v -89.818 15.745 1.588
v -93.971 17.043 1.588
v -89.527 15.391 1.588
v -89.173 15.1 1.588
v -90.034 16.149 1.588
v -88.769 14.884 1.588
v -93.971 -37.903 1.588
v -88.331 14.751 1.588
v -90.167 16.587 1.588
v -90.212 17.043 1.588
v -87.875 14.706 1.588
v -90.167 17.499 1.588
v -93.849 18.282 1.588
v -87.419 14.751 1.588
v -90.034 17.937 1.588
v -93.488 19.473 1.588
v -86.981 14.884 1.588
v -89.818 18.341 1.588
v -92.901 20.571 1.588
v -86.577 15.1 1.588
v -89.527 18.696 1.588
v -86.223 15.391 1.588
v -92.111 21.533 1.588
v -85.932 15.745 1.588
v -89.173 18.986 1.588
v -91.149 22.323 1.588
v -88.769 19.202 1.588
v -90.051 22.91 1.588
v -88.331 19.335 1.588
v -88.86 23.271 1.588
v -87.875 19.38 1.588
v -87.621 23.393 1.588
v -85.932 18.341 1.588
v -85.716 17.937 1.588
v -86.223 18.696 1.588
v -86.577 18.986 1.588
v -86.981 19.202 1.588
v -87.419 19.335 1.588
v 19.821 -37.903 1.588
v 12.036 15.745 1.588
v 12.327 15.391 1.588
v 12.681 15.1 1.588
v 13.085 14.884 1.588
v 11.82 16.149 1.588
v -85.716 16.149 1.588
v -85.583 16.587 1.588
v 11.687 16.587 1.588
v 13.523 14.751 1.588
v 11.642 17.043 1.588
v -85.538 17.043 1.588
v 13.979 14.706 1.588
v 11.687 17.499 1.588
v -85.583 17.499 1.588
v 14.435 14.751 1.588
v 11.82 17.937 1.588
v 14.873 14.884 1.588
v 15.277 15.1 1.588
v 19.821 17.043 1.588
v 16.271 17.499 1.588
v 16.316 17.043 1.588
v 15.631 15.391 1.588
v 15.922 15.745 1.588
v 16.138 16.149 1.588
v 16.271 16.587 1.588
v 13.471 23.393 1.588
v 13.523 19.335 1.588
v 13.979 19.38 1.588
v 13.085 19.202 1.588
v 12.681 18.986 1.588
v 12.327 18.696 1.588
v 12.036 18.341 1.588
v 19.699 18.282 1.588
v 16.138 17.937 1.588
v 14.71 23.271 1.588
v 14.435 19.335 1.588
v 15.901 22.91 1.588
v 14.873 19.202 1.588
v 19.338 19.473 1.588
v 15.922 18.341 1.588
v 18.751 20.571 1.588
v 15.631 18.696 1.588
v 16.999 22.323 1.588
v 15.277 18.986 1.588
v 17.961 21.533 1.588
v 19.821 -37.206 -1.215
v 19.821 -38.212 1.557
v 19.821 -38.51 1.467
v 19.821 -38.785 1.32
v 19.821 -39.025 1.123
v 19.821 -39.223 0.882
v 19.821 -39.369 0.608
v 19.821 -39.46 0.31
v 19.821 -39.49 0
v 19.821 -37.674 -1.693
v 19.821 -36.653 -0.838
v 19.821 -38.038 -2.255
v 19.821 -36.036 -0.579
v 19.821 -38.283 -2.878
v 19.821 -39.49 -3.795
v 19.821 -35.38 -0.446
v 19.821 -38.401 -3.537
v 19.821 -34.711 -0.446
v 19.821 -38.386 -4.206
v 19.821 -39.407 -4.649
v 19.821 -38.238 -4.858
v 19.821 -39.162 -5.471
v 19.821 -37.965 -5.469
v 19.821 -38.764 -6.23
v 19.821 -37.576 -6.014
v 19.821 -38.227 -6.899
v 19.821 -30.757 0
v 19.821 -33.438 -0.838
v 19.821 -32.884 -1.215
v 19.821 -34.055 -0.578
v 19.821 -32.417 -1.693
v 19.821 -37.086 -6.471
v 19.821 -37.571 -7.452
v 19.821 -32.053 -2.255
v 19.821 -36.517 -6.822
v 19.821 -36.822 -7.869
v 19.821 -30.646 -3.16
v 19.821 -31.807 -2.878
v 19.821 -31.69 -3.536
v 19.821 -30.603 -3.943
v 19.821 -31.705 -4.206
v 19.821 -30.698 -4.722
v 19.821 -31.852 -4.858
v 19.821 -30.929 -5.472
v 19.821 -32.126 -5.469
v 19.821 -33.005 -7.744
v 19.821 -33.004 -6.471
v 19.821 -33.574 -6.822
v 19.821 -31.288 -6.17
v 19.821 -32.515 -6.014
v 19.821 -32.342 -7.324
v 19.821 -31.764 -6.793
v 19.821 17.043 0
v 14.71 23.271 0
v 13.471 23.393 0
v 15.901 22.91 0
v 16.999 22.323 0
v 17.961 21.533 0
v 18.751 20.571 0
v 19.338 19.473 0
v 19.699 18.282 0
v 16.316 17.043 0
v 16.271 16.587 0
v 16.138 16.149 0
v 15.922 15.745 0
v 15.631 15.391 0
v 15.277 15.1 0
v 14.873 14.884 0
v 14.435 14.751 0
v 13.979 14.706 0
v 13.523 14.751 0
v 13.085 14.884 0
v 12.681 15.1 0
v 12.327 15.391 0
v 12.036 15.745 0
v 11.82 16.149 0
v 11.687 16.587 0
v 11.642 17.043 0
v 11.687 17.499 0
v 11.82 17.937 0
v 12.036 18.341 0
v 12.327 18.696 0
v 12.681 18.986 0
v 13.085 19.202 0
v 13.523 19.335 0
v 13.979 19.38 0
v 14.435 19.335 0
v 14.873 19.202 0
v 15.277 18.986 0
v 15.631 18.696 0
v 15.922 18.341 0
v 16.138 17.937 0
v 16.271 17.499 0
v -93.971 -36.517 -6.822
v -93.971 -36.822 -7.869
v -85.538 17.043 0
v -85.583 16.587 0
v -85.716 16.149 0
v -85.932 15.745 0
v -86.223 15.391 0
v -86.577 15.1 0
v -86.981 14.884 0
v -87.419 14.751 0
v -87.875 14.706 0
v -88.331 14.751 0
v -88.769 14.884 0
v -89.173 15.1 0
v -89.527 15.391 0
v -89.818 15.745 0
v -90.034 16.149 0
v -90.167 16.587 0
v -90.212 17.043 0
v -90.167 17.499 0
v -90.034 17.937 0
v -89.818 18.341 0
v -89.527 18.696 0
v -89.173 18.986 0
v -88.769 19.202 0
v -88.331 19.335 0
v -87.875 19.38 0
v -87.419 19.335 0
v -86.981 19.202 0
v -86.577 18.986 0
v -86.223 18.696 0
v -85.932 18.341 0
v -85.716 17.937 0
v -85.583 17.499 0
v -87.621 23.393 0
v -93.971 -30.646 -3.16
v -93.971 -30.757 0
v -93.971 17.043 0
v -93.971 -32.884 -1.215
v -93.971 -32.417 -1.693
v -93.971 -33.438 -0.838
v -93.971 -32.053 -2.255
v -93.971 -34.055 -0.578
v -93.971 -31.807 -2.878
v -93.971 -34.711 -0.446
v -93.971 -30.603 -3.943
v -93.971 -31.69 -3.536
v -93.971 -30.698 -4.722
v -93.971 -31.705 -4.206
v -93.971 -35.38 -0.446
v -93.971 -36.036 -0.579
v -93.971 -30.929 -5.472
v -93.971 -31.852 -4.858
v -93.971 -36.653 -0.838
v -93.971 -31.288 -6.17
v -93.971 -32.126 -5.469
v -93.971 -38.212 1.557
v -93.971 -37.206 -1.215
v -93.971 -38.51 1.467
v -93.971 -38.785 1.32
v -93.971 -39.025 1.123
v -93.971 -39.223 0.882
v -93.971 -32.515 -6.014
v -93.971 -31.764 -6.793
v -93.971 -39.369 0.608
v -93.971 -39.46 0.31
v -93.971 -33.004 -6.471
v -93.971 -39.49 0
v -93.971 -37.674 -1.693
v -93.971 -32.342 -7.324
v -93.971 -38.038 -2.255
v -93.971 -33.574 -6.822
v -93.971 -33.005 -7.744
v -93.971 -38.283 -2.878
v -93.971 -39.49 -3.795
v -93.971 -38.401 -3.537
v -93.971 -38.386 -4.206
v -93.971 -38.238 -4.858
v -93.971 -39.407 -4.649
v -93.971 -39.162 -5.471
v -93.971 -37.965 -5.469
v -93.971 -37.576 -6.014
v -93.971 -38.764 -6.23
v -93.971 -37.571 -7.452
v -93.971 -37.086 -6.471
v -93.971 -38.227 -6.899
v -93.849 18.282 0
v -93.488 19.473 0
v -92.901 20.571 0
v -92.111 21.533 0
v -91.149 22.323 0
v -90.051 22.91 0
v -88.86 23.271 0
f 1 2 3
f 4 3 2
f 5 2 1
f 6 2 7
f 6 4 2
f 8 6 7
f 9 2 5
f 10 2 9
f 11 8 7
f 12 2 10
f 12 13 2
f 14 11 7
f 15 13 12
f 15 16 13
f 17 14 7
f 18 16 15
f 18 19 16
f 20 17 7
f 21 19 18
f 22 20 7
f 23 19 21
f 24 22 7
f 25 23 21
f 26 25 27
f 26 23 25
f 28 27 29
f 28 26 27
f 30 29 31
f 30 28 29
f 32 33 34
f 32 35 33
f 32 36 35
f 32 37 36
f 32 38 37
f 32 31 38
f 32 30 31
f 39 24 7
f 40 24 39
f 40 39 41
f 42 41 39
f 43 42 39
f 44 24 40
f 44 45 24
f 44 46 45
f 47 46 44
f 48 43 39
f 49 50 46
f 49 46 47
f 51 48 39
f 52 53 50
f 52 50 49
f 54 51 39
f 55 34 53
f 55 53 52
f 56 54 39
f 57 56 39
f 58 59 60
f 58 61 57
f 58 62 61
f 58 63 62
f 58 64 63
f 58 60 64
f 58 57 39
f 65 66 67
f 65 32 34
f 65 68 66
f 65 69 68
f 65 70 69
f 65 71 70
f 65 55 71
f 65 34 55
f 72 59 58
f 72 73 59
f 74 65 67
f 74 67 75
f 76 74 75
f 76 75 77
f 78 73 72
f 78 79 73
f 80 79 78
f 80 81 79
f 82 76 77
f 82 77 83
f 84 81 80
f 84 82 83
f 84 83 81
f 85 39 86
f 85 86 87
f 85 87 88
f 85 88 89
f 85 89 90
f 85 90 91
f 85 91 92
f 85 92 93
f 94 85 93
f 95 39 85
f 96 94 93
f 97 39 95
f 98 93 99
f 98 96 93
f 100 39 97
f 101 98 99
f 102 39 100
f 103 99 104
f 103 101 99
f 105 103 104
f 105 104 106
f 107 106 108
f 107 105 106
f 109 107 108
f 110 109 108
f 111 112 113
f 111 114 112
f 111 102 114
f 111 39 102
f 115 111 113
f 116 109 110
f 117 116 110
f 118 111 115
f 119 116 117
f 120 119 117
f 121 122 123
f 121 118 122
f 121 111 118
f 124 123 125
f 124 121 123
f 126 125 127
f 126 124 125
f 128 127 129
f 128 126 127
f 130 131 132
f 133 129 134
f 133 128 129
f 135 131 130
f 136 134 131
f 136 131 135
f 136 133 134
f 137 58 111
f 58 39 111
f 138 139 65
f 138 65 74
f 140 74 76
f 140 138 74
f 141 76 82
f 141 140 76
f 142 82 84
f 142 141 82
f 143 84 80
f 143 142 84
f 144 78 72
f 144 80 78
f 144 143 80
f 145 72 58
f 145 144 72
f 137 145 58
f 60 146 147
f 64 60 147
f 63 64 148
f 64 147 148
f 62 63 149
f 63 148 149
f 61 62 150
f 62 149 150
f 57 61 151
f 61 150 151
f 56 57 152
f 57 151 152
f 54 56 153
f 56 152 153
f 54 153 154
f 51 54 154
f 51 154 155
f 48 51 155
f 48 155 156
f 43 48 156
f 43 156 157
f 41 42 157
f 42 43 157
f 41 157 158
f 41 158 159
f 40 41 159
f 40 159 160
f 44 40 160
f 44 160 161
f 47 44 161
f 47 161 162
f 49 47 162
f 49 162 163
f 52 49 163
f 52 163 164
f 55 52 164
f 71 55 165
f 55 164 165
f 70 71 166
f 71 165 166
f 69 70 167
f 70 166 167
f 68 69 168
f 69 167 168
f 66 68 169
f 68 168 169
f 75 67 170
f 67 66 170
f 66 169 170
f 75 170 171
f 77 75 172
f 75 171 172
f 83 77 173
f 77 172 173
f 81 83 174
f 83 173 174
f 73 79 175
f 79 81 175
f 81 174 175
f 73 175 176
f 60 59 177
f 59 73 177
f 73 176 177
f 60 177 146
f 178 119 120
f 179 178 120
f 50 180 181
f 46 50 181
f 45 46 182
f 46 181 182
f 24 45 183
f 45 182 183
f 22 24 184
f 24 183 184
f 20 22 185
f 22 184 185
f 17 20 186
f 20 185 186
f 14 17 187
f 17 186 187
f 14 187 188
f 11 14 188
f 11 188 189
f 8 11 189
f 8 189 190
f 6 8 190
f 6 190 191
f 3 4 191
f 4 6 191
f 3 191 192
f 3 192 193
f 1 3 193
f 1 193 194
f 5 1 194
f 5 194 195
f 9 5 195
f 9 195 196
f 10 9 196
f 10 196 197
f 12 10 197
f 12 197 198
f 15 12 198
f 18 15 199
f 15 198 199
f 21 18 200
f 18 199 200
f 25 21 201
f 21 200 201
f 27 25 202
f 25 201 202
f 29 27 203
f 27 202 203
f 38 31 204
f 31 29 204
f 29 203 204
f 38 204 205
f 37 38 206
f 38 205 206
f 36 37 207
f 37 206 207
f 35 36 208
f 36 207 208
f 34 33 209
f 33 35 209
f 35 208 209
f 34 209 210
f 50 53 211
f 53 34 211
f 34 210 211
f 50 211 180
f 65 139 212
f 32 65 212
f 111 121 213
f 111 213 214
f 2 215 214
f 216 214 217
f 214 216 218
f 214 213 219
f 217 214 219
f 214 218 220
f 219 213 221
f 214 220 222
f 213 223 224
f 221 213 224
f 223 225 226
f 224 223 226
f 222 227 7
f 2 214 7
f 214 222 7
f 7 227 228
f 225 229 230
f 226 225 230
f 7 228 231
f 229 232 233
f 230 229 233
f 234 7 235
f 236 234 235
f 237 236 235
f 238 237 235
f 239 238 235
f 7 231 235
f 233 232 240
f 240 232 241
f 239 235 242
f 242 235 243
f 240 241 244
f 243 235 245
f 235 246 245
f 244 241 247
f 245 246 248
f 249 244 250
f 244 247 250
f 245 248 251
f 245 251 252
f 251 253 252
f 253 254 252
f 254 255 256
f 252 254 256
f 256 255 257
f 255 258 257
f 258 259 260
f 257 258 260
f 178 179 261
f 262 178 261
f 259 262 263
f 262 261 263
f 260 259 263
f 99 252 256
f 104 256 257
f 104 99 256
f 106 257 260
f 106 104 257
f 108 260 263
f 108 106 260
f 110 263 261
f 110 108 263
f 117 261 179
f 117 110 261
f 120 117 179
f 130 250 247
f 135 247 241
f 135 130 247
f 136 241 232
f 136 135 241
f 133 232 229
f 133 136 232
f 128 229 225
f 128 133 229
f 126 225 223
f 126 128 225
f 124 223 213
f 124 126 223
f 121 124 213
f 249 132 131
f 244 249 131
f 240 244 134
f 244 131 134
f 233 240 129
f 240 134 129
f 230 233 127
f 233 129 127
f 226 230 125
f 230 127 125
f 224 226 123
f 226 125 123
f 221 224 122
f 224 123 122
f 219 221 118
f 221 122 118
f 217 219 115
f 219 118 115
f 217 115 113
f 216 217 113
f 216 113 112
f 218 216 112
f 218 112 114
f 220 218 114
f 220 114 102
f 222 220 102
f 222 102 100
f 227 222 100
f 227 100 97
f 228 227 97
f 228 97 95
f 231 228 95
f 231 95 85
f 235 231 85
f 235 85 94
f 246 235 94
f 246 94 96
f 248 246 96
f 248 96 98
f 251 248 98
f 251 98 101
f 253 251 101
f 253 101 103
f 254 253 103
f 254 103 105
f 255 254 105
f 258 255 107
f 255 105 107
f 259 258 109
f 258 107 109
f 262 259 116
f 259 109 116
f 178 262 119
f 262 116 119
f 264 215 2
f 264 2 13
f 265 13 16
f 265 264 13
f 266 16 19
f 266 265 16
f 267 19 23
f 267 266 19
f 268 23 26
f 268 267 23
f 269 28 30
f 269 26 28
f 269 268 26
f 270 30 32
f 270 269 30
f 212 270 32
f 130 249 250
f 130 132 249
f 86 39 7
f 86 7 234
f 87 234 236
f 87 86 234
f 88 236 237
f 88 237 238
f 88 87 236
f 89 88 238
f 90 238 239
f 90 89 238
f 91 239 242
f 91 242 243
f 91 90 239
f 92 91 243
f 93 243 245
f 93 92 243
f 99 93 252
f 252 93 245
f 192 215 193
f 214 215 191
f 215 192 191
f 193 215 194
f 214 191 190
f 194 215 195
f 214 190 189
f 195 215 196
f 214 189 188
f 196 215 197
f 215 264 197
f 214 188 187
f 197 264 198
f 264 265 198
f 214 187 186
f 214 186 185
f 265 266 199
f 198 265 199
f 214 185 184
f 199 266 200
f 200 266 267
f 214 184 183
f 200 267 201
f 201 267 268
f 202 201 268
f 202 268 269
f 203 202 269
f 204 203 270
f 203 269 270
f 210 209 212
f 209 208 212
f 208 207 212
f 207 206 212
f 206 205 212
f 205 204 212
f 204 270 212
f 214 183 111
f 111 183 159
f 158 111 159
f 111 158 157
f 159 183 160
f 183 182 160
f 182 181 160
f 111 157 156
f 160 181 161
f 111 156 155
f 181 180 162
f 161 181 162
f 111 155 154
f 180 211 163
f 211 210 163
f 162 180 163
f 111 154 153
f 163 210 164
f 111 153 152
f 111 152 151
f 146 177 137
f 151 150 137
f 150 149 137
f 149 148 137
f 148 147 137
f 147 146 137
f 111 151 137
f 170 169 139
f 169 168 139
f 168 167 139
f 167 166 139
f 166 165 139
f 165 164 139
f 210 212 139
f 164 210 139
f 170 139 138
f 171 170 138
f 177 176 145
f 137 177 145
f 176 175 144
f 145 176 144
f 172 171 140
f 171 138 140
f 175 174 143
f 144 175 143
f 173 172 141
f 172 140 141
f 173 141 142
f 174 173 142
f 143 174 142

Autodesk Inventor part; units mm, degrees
ref_plane "YZ Plane" through (0, 0, 0) normal (1, 0, 0) x (0, 1, 0)
ref_plane "XZ Plane" through (0, 0, 0) normal (0, 1, 0) x (-1, 0, 0)
ref_plane "XY Plane" through (0, 0, 0) normal (0, 0, 1) x (1, 0, 0)
sketch "Sketch1" plane through (0, 0, 0) normal (1, 0, 0) x (0, 1, 0)
  point P0 (0, 0)
sketch "Sketch2" plane through (0, 0, 0) normal (0, 0, 1) x (1, 0, 0)
  circle A0 centre (13.979, 17.0432) radius 2.3368 projected
  circle A1 centre (13.725, -33.7568) radius 2.3368 projected
  circle A2 centre (-87.875, -33.7568) radius 2.3368 projected
  circle A3 centre (-87.875, 17.0432) radius 2.3368 projected
  line L0 (-87.621, -39.5988) -> (13.471, -39.5988) projected
  arc A4 (-93.971, -33.2488) -> (-87.621, -39.5988) centre (-87.621, -33.2488) ccw projected
  line L1 (-93.971, 17.0432) -> (-93.971, -33.2488) projected
  arc A5 (-87.621, 23.3932) -> (-93.971, 17.0432) centre (-87.621, 17.0432) ccw projected
  line L2 (13.471, 23.3932) -> (-87.621, 23.3932) projected
  arc A6 (19.821, 17.0432) -> (13.471, 23.3932) centre (13.471, 17.0432) ccw projected
  line L3 (19.821, -33.2488) -> (19.821, 17.0432) projected
  arc A7 (13.471, -39.5988) -> (19.821, -33.2488) centre (13.471, -33.2488) ccw projected
  circle A8 centre (13.725, -33.7568) radius 2.3368 projected
  circle A9 centre (13.979, 17.0432) radius 2.3368 projected
  circle A10 centre (-87.875, -33.7568) radius 2.3368 projected
  circle A11 centre (-87.875, 17.0432) radius 2.3368 projected
  point P0 (0, 0)
extrude "Extrusion1" add sketch "Sketch2" along normal blind 1.5875
sketch "Sketch3" plane through (19.821, -33.2488, 0) normal (1, 0, 0) x (0, 0, -1)
  circle A0 centre (3.7949, -1.7964) radius 3.3655
  circle A1 centre (3.7949, -1.7964) radius 4.445
  line L0 (3.1599, 2.6031) -> (-0.6501, 2.4684)
  line L1 (-0.6501, 2.4684) -> (-0.6501, -1.7964)
  line L2 (-0.6501, -1.7964) -> (-0.493, -6.2414)
  line L3 (-0.493, -6.2414) -> (3.7949, -6.2414)
  line L4 (0, 0) -> (0, 50.292) projected
  line L5 (7.1604, -1.7964) -> (8.2399, -1.7964)
  line L6 (6.8216, -0.3249) -> (7.744, 0.2439)
  line L7 (6.8216, -3.2678) -> (7.8694, -3.5728)
  point P0 (0, 33.2488)
  point P1 (0, 2.4914)
  point P2 (0, 1.3549)
  point P3 (-0.6391, -2.1102)
  point P4 (0, 0.5182)
  dimension "d2" = 6.731
  dimension "d3" = 8.89
extrude "Extrusion2" add sketch "Sketch3" against normal up to surface (113.792 mm away) contours L5 A1 L7 A0 | A0 L6 A1 L5 | A0 L7 A1 L6 | A1 L4 L0
sketch "Sketch4" plane through (0, 0, 1.5875) normal (0, 0, 1) x (1, 0, 0)
  circle A0 centre (13.725, -33.7568) radius 2.3368 projected
  line L0 (19.821, -39.4902) -> (-93.971, -39.4902) projected
  line L1 (19.821, -39.4902) -> (19.821, -30.6002) projected
  line L2 (19.821, -30.7575) -> (-93.971, -30.7575) projected
  line L3 (19.821, -39.4902) -> (-93.971, -39.4902)
  line L4 (-93.971, -39.4902) -> (-93.971, -30.7575)
  line L5 (-93.971, -30.7575) -> (19.821, -30.7575)
  line L6 (19.821, -30.7575) -> (19.821, -39.4902)
  circle A1 centre (-87.875, -33.7568) radius 2.3368 projected
  circle A2 centre (-87.875, 17.0432) radius 2.3368 projected
  circle A3 centre (-87.875, 17.0432) radius 2.921
  circle A4 centre (13.979, 17.0432) radius 2.3368 projected
  circle A5 centre (13.979, 17.0432) radius 2.921
  point P0 (0, 0)
  point P1 (19.821, -33.2488)
  point P2 (19.821, -30.6458)
  dimension "d6" = 5.842
  dimension "d7" = 5.842
extrude "Extrusion3" add sketch "Sketch4" against normal up to surface contours A0 | L0 L4 L2 L1 | A1
sketch "Sketch5" plane through (19.821, 17.0432, 1.5875) normal (1, 0, 0) x (0, 0, -1)
  line L0 (0, -56.5334) -> (0, -56.642) projected
  line L1 (0, -56.5334) -> (1.6302, -56.5334)
  line L2 (1.6302, -56.5334) -> (1.6302, -56.6709)
  line L3 (1.6302, -56.6709) -> (0, -56.6709)
  line L4 (0, -56.6709) -> (0, -56.5334)
  point P0 (1.5875, -17.0432)
extrude "Extrusion4" cut sketch "Sketch5" against normal blind 136.017
fillet "Fillet1" radius 1.5875 1 edges at (-37.075, -39.4902, 1.5875)
sketch "Sketch6" plane through (-93.971, 17.0432, 0) normal (-1, 0, 0) x (0, 0, 1)
  circle A0 centre (-3.7949, -52.0884) radius 3.3655 projected
  line L0 (-7.1604, -52.0884) -> (-8.2399, -52.0884)
  arc A1 (-3.1599, -47.6889) -> (-3.7949, -56.5334) centre (-3.7949, -52.0884) ccw projected
  line L1 (-7.4629, -53.118) -> (-8.0595, -53.3483)
  line L2 (-7.4629, -51.0587) -> (-8.0595, -50.8284)
  point P0 (0, -17.0432)
  point P1 (-7.4631, -51.0586)
  point P2 (-8.0577, -50.8291)
  point P3 (-8.0577, -53.3476)
  point P4 (-7.4631, -53.1181)
extrude "Extrusion6" cut sketch "Sketch3" against normal blind 115.8875 contours L5 A1 L7 A0 | A0 L6 A1 L5
properties part number "plate holder holder"
